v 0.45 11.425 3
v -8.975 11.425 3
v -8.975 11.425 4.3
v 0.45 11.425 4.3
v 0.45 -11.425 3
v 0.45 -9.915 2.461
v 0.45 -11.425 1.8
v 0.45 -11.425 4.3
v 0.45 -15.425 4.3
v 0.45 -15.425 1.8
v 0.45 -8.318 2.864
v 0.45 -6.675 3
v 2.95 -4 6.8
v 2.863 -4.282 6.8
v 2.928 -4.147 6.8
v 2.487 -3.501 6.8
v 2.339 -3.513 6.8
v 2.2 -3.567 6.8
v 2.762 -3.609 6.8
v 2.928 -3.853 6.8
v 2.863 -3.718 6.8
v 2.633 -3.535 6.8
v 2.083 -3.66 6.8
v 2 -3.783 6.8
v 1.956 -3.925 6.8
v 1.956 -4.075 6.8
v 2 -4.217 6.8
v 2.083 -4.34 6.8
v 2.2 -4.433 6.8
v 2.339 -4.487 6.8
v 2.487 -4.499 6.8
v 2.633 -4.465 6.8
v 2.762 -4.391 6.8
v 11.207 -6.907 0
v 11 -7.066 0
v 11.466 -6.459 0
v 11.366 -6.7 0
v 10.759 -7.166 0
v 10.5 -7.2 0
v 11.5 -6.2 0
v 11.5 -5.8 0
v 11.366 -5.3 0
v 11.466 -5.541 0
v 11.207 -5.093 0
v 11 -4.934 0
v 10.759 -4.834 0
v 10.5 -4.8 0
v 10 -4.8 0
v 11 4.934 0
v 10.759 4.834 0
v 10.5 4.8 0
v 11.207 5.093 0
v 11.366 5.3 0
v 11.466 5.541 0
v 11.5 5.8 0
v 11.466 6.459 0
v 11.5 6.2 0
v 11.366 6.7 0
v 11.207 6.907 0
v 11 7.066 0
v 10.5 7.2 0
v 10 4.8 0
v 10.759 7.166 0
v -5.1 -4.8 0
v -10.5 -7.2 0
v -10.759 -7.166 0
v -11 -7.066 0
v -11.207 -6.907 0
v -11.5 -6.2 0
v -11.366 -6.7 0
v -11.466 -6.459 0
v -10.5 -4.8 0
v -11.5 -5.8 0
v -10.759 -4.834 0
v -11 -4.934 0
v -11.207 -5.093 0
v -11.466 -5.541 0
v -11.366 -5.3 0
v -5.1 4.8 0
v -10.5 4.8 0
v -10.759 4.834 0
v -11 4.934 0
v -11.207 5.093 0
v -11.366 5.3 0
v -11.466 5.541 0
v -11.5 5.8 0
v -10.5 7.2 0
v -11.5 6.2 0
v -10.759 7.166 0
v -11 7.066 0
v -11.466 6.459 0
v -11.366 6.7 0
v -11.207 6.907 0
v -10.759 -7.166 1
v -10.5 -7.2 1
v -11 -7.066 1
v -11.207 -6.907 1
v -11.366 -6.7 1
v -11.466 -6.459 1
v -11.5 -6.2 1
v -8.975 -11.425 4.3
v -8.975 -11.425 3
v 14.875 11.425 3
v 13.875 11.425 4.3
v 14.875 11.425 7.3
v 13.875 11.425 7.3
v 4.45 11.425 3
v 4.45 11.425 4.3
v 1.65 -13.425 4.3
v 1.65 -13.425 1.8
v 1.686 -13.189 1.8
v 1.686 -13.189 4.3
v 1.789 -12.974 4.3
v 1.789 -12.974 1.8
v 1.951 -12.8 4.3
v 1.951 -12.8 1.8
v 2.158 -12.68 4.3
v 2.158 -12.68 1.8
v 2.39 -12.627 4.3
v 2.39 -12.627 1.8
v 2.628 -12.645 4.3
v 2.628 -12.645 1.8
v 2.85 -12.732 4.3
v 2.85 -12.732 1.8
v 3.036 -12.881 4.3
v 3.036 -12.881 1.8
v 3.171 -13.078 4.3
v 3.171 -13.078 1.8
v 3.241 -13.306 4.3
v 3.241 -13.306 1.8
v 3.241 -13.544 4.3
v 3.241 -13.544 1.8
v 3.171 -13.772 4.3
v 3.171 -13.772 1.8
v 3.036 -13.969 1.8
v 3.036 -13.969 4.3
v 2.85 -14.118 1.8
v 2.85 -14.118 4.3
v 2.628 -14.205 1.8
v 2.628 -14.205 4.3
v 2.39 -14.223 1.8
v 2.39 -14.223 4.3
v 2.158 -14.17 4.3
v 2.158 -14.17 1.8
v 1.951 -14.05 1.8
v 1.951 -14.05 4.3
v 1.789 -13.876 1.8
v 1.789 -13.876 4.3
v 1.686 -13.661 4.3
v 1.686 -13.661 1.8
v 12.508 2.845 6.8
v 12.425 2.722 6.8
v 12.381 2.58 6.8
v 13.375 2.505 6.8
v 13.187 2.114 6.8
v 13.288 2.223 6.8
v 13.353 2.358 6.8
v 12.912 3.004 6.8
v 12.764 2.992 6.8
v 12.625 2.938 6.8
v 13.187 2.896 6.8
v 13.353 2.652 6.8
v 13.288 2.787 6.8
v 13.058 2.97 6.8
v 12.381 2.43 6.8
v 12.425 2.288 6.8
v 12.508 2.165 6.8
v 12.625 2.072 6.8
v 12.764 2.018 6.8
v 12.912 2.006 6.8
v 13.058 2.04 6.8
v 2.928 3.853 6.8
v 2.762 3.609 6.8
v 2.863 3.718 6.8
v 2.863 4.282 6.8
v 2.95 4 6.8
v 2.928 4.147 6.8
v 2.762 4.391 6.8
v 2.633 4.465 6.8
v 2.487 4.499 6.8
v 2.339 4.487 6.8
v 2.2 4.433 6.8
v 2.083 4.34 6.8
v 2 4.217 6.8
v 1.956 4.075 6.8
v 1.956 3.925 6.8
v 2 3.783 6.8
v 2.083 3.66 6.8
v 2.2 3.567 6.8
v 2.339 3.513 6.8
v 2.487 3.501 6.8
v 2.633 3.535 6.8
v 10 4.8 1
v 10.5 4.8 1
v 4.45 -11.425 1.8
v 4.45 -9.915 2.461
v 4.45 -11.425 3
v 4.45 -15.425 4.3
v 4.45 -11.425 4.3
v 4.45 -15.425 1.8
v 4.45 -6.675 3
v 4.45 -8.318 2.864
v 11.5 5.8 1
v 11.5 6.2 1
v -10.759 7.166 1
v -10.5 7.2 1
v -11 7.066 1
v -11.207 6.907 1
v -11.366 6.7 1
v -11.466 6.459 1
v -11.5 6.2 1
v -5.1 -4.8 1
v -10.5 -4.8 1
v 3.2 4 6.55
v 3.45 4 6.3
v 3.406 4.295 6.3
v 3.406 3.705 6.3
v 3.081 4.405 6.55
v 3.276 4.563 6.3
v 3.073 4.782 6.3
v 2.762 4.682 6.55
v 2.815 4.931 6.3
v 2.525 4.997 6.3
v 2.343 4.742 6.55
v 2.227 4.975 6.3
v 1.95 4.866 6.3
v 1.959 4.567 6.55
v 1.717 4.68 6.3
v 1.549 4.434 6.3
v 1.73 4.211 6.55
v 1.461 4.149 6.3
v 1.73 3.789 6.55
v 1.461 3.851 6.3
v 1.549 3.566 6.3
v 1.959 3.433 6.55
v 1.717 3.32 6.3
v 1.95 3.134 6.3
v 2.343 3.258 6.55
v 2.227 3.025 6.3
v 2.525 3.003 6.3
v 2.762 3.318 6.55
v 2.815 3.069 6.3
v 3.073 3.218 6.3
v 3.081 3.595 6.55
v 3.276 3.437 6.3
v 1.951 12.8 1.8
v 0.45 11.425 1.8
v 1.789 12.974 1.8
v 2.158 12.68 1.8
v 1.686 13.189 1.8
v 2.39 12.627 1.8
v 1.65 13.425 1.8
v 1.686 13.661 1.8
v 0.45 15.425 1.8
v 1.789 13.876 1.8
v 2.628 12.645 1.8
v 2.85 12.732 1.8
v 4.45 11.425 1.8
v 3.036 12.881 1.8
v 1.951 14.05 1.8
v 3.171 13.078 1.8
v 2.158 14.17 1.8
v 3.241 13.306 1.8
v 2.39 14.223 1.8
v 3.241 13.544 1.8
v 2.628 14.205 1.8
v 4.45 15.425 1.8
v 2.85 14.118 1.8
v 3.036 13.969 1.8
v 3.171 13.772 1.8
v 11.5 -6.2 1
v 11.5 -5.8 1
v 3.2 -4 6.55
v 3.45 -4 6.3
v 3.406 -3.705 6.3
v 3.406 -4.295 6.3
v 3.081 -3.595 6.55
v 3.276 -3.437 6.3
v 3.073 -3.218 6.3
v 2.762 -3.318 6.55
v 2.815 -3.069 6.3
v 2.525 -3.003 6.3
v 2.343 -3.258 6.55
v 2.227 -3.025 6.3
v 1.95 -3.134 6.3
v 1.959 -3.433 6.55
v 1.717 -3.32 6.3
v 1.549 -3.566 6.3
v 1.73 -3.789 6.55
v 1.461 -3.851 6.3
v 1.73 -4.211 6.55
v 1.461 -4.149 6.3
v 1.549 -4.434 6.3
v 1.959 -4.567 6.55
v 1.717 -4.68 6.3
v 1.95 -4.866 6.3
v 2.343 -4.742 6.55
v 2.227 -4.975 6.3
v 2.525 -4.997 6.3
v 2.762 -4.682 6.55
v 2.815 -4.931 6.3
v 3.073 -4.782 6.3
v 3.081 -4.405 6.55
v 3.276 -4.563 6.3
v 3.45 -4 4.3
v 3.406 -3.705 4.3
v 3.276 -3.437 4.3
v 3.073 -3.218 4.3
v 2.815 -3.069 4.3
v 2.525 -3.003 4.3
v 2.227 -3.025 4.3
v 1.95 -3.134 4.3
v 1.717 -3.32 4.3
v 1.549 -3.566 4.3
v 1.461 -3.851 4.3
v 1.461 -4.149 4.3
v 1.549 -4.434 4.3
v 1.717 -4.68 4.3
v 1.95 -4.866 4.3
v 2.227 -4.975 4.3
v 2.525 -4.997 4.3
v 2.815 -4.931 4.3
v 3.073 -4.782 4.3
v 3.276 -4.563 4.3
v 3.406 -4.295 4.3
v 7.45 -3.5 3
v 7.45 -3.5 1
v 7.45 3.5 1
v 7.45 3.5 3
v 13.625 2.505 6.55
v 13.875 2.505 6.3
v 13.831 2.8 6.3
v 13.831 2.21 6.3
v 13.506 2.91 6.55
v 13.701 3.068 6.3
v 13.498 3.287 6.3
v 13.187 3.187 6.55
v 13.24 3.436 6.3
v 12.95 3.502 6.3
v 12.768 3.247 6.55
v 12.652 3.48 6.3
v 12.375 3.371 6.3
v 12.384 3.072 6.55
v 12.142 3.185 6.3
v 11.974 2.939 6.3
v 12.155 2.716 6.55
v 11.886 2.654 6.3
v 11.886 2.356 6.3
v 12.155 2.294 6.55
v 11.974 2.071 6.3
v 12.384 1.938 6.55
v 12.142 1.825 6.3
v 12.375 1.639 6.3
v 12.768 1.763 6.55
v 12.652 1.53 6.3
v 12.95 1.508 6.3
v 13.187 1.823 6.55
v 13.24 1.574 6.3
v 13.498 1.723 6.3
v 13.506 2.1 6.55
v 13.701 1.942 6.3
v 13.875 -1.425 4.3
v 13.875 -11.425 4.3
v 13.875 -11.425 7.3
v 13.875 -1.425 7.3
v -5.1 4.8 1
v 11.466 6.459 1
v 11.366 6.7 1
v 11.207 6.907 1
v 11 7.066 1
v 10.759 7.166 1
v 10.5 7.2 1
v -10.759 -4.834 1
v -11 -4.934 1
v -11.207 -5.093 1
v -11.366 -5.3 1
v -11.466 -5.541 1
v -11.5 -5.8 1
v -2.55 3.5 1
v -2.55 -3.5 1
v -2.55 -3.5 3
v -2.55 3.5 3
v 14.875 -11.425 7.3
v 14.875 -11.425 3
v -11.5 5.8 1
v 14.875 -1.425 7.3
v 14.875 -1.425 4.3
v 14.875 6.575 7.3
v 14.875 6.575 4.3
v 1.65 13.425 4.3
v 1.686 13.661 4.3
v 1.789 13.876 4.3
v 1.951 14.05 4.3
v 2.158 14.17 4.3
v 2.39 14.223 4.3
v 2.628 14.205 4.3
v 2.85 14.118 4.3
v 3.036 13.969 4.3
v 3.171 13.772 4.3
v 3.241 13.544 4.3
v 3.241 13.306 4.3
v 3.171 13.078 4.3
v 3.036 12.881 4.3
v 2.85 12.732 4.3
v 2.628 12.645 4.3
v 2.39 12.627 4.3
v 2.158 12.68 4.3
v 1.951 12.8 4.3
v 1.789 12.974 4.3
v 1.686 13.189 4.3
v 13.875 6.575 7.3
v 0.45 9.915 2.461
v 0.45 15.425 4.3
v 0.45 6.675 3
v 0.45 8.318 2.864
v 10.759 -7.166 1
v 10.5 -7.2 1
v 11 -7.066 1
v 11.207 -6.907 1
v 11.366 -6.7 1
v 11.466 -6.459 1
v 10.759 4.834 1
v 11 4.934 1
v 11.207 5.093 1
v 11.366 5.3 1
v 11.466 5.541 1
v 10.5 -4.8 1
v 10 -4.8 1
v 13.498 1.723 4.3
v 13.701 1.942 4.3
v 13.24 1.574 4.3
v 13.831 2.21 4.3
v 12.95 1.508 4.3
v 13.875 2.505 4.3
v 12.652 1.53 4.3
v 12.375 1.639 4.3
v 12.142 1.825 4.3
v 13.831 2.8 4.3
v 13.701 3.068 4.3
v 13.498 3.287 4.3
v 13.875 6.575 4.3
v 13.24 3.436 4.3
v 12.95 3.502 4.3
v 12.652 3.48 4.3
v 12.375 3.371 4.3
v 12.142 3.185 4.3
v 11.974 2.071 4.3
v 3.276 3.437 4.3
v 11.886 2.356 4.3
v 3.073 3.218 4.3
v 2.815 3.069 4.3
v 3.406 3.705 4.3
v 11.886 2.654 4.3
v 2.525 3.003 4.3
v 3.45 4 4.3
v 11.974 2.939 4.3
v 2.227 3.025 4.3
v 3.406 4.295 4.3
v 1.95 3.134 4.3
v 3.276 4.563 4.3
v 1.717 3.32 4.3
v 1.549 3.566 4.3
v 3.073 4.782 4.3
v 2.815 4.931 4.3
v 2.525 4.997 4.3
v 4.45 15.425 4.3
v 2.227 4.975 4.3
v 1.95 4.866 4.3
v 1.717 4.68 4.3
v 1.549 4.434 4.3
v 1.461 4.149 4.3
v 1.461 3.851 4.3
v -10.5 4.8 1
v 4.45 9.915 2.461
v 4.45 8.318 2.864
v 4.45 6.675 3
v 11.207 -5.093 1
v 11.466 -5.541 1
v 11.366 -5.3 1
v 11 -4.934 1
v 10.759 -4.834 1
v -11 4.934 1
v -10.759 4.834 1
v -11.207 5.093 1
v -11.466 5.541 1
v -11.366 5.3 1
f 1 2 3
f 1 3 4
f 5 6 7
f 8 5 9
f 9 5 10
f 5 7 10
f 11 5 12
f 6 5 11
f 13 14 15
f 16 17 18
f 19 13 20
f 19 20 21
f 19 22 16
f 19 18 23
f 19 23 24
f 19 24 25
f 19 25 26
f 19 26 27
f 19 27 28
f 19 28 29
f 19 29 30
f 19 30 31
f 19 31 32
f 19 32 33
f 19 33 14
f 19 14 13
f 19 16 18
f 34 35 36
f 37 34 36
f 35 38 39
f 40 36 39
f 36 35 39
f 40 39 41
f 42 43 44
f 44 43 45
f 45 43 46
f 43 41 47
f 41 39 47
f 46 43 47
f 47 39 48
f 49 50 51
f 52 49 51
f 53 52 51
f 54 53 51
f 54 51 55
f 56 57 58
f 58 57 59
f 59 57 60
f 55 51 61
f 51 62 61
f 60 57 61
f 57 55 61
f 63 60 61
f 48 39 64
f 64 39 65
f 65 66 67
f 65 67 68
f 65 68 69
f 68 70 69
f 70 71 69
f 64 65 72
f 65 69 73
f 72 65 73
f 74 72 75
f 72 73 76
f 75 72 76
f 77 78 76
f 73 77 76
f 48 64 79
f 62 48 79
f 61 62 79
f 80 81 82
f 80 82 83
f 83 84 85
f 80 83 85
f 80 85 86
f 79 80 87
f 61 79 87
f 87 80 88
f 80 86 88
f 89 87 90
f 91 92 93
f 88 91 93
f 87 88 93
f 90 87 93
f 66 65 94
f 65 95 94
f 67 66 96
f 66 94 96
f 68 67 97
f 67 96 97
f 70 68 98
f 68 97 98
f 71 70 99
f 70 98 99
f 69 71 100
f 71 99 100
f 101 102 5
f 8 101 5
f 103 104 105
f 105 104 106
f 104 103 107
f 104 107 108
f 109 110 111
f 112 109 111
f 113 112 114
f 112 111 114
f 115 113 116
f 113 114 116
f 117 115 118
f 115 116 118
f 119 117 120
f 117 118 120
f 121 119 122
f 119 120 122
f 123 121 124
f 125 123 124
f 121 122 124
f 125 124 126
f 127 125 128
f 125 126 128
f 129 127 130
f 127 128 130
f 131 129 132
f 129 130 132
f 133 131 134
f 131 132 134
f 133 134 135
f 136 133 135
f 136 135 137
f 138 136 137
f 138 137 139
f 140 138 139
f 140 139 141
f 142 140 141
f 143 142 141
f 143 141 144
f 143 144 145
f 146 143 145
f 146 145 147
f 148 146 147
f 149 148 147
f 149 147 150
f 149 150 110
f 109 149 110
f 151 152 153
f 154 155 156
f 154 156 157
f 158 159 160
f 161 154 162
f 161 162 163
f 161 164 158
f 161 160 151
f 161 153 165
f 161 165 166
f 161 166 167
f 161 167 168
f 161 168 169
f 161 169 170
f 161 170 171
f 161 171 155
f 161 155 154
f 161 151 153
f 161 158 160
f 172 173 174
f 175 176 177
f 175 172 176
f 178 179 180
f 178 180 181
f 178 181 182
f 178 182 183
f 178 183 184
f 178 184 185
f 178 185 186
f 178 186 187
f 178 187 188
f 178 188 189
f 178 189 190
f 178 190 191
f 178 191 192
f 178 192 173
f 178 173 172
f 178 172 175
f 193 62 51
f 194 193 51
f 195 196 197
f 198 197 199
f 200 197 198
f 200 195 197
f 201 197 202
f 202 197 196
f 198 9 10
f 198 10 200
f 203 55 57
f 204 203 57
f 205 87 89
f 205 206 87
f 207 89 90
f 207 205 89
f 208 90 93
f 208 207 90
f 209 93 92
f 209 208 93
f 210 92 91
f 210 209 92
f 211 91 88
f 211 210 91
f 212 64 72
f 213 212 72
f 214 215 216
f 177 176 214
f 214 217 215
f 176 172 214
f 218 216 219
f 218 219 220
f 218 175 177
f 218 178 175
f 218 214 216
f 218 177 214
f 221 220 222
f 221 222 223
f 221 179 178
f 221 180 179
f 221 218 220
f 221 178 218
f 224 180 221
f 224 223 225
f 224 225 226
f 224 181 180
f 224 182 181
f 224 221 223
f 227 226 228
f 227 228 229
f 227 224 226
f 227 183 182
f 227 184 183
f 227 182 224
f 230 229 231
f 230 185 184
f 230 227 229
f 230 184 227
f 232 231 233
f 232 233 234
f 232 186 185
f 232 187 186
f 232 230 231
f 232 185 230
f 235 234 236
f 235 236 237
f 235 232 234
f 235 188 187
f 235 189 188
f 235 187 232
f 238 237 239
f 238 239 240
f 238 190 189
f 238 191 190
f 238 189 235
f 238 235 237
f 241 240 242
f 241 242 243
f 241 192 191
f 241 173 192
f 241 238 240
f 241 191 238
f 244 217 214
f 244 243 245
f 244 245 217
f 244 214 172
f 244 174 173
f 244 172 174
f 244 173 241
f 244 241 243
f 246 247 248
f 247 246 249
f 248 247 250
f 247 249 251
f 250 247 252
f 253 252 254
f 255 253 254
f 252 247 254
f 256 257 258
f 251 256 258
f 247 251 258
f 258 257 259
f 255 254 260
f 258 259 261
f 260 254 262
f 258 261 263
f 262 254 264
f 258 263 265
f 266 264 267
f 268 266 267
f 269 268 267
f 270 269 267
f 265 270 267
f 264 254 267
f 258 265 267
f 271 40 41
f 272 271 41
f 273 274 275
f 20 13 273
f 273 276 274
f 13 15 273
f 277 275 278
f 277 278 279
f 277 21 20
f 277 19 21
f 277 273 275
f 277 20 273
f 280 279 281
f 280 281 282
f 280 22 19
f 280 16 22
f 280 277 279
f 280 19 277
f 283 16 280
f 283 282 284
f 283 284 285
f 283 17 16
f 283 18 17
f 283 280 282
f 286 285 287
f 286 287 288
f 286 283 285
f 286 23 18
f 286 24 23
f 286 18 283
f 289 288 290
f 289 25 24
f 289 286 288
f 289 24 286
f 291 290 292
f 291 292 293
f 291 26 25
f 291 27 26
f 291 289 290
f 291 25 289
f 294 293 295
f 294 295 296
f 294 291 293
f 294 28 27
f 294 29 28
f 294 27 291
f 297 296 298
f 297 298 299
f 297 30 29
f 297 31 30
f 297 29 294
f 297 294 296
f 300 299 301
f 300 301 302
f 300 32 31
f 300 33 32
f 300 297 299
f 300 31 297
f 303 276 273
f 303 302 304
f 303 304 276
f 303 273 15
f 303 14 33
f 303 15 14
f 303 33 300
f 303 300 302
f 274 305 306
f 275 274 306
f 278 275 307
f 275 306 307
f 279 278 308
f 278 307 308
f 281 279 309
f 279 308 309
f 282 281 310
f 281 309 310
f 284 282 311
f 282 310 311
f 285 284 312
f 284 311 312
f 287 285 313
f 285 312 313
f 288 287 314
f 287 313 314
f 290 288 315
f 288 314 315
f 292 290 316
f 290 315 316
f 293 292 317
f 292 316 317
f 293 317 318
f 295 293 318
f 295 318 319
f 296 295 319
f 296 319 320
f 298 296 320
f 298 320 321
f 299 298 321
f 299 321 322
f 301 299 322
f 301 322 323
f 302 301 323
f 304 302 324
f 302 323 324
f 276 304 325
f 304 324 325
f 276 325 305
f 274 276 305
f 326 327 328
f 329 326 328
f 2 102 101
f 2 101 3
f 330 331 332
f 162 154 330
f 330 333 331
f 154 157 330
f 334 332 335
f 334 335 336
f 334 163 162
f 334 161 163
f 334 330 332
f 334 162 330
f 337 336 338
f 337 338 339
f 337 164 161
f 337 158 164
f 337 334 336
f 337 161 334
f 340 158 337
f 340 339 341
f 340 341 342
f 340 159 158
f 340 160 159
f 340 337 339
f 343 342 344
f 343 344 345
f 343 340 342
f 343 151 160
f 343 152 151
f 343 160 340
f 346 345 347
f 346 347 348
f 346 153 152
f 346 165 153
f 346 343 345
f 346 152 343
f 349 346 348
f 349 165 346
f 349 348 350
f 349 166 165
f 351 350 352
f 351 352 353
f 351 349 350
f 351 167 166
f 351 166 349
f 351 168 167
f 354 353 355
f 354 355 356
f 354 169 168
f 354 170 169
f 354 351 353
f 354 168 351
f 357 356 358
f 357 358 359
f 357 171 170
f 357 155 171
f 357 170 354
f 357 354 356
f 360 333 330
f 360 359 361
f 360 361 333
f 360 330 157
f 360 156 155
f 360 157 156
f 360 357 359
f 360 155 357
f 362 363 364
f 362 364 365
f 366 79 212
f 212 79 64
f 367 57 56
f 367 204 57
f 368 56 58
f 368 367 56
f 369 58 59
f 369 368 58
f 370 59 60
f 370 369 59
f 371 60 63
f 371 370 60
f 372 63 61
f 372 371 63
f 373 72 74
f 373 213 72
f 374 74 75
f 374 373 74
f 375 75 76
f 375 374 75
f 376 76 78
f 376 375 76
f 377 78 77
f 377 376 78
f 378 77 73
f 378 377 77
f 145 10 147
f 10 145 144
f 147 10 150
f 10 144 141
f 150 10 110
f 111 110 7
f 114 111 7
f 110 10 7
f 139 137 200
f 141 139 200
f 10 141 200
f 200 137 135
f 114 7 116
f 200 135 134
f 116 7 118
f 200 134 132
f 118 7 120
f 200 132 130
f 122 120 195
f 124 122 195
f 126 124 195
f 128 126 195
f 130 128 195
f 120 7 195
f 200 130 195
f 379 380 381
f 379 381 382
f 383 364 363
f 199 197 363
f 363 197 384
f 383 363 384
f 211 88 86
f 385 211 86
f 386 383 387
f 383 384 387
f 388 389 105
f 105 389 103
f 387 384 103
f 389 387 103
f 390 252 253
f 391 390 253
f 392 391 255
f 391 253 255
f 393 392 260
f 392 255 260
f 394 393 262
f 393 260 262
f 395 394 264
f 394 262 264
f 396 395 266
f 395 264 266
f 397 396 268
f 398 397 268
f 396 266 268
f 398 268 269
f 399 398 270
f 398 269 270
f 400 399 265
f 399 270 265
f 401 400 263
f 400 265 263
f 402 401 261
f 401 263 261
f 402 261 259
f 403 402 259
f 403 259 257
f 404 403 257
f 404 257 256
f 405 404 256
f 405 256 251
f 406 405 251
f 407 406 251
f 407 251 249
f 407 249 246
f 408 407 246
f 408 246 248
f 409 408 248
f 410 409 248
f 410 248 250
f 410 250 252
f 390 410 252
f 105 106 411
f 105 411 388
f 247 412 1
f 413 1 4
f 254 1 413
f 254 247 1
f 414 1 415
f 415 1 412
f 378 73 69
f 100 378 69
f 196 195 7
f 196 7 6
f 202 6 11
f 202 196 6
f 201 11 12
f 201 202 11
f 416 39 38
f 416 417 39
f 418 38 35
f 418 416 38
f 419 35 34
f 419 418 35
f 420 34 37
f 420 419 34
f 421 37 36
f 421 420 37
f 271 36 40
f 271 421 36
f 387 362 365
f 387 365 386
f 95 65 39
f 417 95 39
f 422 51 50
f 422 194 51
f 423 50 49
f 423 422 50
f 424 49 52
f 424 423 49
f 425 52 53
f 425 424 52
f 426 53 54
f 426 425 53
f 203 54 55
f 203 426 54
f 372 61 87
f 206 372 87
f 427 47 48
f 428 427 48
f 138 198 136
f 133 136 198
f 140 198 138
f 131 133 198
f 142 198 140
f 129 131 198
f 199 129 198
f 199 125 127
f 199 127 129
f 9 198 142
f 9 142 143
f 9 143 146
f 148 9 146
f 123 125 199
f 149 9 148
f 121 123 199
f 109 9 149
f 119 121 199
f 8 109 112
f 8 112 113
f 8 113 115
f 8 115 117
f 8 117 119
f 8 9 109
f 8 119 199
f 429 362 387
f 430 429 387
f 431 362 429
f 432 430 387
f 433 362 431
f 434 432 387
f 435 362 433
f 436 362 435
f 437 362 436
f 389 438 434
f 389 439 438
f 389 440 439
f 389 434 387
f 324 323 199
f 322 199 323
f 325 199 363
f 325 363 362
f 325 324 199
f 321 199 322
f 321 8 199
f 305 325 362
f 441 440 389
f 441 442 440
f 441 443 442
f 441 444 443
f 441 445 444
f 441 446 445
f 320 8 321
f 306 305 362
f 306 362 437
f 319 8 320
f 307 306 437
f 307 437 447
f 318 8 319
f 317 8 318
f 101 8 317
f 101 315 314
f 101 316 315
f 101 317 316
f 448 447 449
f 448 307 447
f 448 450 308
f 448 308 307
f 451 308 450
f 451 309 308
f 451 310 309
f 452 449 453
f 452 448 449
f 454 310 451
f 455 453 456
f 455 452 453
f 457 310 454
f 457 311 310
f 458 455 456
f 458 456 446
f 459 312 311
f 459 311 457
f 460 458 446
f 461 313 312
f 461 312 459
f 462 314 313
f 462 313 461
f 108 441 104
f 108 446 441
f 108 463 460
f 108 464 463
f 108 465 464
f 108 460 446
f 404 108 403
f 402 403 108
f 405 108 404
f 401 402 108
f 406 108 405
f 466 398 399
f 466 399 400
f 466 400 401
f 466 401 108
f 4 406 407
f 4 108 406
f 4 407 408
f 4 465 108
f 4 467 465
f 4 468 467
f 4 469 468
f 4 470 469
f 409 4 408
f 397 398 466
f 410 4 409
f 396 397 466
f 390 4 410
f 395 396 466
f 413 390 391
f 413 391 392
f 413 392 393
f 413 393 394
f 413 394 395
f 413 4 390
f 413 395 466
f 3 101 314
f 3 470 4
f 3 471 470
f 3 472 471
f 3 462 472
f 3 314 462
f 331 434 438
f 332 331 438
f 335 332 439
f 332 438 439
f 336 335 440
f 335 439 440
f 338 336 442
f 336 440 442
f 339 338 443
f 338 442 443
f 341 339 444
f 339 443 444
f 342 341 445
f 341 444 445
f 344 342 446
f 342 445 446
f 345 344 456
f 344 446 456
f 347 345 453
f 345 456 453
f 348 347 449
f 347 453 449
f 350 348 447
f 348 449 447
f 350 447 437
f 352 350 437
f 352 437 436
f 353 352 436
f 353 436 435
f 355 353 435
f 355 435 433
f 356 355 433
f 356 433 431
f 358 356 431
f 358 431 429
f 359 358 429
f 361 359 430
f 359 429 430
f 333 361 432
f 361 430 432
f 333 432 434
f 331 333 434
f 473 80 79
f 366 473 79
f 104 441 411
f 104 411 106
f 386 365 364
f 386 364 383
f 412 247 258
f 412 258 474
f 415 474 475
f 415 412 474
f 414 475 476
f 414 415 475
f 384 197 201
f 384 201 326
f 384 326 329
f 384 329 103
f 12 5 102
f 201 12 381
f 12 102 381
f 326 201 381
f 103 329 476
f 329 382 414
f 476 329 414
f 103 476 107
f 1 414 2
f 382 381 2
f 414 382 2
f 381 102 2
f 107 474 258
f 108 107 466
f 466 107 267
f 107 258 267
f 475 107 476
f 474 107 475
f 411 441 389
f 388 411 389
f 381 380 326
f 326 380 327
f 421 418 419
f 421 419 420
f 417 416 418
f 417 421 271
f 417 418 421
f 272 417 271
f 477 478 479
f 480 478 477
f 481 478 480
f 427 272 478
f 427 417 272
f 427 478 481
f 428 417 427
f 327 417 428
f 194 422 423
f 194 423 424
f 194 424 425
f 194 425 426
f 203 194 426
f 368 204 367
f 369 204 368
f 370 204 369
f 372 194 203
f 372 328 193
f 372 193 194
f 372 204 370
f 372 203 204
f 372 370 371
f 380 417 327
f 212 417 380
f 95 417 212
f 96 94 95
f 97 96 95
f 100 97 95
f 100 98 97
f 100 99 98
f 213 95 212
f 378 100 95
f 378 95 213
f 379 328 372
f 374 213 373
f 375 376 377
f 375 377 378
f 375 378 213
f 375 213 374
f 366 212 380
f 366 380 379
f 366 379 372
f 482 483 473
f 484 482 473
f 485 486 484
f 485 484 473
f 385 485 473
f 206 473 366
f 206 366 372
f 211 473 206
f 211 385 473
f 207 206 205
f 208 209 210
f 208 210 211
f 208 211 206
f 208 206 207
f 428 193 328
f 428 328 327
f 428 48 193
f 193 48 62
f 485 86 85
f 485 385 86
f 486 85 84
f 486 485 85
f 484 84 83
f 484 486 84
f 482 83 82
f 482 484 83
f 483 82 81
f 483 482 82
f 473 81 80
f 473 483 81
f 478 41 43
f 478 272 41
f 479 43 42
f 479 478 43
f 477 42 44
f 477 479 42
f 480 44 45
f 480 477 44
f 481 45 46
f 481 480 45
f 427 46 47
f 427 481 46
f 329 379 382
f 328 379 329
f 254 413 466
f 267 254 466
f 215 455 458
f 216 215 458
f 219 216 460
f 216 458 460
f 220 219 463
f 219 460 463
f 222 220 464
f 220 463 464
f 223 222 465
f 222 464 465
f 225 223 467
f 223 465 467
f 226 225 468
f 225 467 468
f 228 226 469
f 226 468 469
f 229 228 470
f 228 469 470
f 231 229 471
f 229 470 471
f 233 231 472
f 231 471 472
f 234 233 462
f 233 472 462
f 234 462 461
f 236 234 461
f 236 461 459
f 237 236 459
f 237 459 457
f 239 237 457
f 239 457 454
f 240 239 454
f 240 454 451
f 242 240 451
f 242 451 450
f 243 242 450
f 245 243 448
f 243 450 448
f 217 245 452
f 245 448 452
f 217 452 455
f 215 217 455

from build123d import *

# Parameters (mm, degrees)
BOSS_EXTRUDE1_DEPTH     = 1
FILLET2_R               = 1
SKETCH3_W               = 10
SKETCH3_H               = 7
BOSS_EXTRUDE2_DEPTH     = 2
SKETCH4_W               = 22.85
SKETCH4_H               = 22.85
BOSS_EXTRUDE3_DEPTH     = 1.3
SKETCH7_W               = 4
SKETCH7_H               = 4
BOSS_EXTRUDE4_DEPTH     = 2.5
FILLET3_R               = 10
FILLET4_R               = 10
TAP_DRILL_FOR_M2_TAP1_D = 1.6
SKETCH11_W              = 22.85
SKETCH11_H              = 1.3
BOSS_EXTRUDE5_DEPTH     = 1
SKETCH12_W              = 1
SKETCH12_H              = 10
SKETCH12_H_2            = 4.85
BOSS_EXTRUDE6_DEPTH     = 3
SKETCH13_R              = 1
BOSS_EXTRUDE7_DEPTH     = 2.5
CHAMFER2_SIZE           = 0.5


with BuildPart() as part:
    # Sketch2 → Boss-Extrude1 (new body)
    with BuildSketch(Plane(origin=(0, 0, 0), x_dir=(0, 1, 0), z_dir=(0, 0, 1))):
        Polygon((-7.2, 11.5), (-7.2, -11.5), (-4.8, -11.5), (-4.8, -10), (4.8, -10), (4.8, -11.5), (7.2, -11.5), (7.2, 11.5), (4.8, 11.5), (4.8, 5.1), (-4.8, 5.1), (-4.8, 11.5), align=None)
    extrude(amount=BOSS_EXTRUDE1_DEPTH)

    # Fillet2
    fillet2_edges = [part.edges().sort_by_distance(p)[0] for p in [
        (11.5, 7.2, 0.5),
        (11.5, 4.8, 0.5),
        (11.5, -4.8, 0.5),
        (11.5, -7.2, 0.5),
        (-11.5, -7.2, 0.5),
        (-11.5, -4.8, 0.5),
        (-11.5, 4.8, 0.5),
        (-11.5, 7.2, 0.5),
    ]]
    fillet(fillet2_edges, radius=FILLET2_R)

    # Sketch3 → Boss-Extrude2 (add)
    with BuildSketch(Plane.XY.offset(1)):
        with Locations((2.45, 0)):
            Rectangle(SKETCH3_W, SKETCH3_H)
    extrude(amount=BOSS_EXTRUDE2_DEPTH)

    # Sketch4 → Boss-Extrude3 (add)
    with BuildSketch(Plane.XY.offset(3)):
        with Locations((2.45, 0)):
            Rectangle(SKETCH4_W, SKETCH4_H)
    extrude(amount=BOSS_EXTRUDE3_DEPTH)

    # Sketch7 → Boss-Extrude4 (add)
    with BuildSketch(Plane.XY.offset(4.3)):
        with Locations((2.45, 13.425)):
            Rectangle(SKETCH7_W, SKETCH7_H)
        with Locations((2.45, -13.425)):
            Rectangle(SKETCH7_W, SKETCH7_H)
    extrude(amount=-BOSS_EXTRUDE4_DEPTH)

    # Fillet3
    # the kernel refuses this fillet: 10 mm, written as the material it adds along each edge
    with BuildSketch(Plane(origin=(0.45, 11.425, 3), x_dir=(0, -1, 0), z_dir=(1, 0, 0))) as fillet3_piece_1:
        with BuildLine():
            CenterArc((4.749736835, 10), FILLET3_R, 241.642363424, 28.357636576)
            Line((0, 1.2), (0, 0))
            Line((0, 0), (4.749736835, 0))
        make_face()
    extrude(amount=4)

    # Fillet4
    # the kernel refuses this fillet: 10 mm, written as the material it adds along each edge
    with BuildSketch(Plane(origin=(4.45, -11.425, 3), x_dir=(0, 1, 0), z_dir=(-1, 0, 0))) as fillet4_piece_1:
        with BuildLine():
            CenterArc((4.749736835, 10), FILLET4_R, 241.642363424, 28.357636576)
            Line((0, 1.2), (0, 0))
            Line((0, 0), (4.749736835, 0))
        make_face()
    extrude(amount=4)

    # Tap Drill for M2 Tap1 (through all)
    with Locations(Plane.XY.offset(4.3)):
        with Locations((2.45, 13.425), (2.45, -13.425)):
            Hole(TAP_DRILL_FOR_M2_TAP1_D / 2)

    # Sketch11 → Boss-Extrude5 (add)
    with BuildSketch(Plane.YZ.offset(13.875)):
        with Locations((0, 3.65)):
            Rectangle(SKETCH11_W, SKETCH11_H)
    extrude(amount=BOSS_EXTRUDE5_DEPTH)

    # Sketch12 → Boss-Extrude6 (add)
    with BuildSketch(Plane.XY.offset(4.3)):
        with Locations((14.375, -6.425)):
            Rectangle(SKETCH12_W, SKETCH12_H)
        with Locations((14.375, 9)):
            Rectangle(SKETCH12_W, SKETCH12_H_2)
    extrude(amount=BOSS_EXTRUDE6_DEPTH)

    # Sketch13 → Boss-Extrude7 (add)
    with BuildSketch(Plane.XY.offset(4.3)):
        with Locations((12.875, 2.505)):
            Circle(SKETCH13_R)
        with Locations((2.45, 4)):
            Circle(SKETCH13_R)
        with Locations((2.45, -4)):
            Circle(SKETCH13_R)
    extrude(amount=BOSS_EXTRUDE7_DEPTH)

    # Chamfer2
    chamfer2_edges = [part.edges().sort_by_distance(p)[0] for p in [
        (11.875, 2.505, 6.8),
        (1.45, -4, 6.8),
        (1.45, 4, 6.8),
    ]]
    chamfer(chamfer2_edges, length=CHAMFER2_SIZE)


solid = part.part
